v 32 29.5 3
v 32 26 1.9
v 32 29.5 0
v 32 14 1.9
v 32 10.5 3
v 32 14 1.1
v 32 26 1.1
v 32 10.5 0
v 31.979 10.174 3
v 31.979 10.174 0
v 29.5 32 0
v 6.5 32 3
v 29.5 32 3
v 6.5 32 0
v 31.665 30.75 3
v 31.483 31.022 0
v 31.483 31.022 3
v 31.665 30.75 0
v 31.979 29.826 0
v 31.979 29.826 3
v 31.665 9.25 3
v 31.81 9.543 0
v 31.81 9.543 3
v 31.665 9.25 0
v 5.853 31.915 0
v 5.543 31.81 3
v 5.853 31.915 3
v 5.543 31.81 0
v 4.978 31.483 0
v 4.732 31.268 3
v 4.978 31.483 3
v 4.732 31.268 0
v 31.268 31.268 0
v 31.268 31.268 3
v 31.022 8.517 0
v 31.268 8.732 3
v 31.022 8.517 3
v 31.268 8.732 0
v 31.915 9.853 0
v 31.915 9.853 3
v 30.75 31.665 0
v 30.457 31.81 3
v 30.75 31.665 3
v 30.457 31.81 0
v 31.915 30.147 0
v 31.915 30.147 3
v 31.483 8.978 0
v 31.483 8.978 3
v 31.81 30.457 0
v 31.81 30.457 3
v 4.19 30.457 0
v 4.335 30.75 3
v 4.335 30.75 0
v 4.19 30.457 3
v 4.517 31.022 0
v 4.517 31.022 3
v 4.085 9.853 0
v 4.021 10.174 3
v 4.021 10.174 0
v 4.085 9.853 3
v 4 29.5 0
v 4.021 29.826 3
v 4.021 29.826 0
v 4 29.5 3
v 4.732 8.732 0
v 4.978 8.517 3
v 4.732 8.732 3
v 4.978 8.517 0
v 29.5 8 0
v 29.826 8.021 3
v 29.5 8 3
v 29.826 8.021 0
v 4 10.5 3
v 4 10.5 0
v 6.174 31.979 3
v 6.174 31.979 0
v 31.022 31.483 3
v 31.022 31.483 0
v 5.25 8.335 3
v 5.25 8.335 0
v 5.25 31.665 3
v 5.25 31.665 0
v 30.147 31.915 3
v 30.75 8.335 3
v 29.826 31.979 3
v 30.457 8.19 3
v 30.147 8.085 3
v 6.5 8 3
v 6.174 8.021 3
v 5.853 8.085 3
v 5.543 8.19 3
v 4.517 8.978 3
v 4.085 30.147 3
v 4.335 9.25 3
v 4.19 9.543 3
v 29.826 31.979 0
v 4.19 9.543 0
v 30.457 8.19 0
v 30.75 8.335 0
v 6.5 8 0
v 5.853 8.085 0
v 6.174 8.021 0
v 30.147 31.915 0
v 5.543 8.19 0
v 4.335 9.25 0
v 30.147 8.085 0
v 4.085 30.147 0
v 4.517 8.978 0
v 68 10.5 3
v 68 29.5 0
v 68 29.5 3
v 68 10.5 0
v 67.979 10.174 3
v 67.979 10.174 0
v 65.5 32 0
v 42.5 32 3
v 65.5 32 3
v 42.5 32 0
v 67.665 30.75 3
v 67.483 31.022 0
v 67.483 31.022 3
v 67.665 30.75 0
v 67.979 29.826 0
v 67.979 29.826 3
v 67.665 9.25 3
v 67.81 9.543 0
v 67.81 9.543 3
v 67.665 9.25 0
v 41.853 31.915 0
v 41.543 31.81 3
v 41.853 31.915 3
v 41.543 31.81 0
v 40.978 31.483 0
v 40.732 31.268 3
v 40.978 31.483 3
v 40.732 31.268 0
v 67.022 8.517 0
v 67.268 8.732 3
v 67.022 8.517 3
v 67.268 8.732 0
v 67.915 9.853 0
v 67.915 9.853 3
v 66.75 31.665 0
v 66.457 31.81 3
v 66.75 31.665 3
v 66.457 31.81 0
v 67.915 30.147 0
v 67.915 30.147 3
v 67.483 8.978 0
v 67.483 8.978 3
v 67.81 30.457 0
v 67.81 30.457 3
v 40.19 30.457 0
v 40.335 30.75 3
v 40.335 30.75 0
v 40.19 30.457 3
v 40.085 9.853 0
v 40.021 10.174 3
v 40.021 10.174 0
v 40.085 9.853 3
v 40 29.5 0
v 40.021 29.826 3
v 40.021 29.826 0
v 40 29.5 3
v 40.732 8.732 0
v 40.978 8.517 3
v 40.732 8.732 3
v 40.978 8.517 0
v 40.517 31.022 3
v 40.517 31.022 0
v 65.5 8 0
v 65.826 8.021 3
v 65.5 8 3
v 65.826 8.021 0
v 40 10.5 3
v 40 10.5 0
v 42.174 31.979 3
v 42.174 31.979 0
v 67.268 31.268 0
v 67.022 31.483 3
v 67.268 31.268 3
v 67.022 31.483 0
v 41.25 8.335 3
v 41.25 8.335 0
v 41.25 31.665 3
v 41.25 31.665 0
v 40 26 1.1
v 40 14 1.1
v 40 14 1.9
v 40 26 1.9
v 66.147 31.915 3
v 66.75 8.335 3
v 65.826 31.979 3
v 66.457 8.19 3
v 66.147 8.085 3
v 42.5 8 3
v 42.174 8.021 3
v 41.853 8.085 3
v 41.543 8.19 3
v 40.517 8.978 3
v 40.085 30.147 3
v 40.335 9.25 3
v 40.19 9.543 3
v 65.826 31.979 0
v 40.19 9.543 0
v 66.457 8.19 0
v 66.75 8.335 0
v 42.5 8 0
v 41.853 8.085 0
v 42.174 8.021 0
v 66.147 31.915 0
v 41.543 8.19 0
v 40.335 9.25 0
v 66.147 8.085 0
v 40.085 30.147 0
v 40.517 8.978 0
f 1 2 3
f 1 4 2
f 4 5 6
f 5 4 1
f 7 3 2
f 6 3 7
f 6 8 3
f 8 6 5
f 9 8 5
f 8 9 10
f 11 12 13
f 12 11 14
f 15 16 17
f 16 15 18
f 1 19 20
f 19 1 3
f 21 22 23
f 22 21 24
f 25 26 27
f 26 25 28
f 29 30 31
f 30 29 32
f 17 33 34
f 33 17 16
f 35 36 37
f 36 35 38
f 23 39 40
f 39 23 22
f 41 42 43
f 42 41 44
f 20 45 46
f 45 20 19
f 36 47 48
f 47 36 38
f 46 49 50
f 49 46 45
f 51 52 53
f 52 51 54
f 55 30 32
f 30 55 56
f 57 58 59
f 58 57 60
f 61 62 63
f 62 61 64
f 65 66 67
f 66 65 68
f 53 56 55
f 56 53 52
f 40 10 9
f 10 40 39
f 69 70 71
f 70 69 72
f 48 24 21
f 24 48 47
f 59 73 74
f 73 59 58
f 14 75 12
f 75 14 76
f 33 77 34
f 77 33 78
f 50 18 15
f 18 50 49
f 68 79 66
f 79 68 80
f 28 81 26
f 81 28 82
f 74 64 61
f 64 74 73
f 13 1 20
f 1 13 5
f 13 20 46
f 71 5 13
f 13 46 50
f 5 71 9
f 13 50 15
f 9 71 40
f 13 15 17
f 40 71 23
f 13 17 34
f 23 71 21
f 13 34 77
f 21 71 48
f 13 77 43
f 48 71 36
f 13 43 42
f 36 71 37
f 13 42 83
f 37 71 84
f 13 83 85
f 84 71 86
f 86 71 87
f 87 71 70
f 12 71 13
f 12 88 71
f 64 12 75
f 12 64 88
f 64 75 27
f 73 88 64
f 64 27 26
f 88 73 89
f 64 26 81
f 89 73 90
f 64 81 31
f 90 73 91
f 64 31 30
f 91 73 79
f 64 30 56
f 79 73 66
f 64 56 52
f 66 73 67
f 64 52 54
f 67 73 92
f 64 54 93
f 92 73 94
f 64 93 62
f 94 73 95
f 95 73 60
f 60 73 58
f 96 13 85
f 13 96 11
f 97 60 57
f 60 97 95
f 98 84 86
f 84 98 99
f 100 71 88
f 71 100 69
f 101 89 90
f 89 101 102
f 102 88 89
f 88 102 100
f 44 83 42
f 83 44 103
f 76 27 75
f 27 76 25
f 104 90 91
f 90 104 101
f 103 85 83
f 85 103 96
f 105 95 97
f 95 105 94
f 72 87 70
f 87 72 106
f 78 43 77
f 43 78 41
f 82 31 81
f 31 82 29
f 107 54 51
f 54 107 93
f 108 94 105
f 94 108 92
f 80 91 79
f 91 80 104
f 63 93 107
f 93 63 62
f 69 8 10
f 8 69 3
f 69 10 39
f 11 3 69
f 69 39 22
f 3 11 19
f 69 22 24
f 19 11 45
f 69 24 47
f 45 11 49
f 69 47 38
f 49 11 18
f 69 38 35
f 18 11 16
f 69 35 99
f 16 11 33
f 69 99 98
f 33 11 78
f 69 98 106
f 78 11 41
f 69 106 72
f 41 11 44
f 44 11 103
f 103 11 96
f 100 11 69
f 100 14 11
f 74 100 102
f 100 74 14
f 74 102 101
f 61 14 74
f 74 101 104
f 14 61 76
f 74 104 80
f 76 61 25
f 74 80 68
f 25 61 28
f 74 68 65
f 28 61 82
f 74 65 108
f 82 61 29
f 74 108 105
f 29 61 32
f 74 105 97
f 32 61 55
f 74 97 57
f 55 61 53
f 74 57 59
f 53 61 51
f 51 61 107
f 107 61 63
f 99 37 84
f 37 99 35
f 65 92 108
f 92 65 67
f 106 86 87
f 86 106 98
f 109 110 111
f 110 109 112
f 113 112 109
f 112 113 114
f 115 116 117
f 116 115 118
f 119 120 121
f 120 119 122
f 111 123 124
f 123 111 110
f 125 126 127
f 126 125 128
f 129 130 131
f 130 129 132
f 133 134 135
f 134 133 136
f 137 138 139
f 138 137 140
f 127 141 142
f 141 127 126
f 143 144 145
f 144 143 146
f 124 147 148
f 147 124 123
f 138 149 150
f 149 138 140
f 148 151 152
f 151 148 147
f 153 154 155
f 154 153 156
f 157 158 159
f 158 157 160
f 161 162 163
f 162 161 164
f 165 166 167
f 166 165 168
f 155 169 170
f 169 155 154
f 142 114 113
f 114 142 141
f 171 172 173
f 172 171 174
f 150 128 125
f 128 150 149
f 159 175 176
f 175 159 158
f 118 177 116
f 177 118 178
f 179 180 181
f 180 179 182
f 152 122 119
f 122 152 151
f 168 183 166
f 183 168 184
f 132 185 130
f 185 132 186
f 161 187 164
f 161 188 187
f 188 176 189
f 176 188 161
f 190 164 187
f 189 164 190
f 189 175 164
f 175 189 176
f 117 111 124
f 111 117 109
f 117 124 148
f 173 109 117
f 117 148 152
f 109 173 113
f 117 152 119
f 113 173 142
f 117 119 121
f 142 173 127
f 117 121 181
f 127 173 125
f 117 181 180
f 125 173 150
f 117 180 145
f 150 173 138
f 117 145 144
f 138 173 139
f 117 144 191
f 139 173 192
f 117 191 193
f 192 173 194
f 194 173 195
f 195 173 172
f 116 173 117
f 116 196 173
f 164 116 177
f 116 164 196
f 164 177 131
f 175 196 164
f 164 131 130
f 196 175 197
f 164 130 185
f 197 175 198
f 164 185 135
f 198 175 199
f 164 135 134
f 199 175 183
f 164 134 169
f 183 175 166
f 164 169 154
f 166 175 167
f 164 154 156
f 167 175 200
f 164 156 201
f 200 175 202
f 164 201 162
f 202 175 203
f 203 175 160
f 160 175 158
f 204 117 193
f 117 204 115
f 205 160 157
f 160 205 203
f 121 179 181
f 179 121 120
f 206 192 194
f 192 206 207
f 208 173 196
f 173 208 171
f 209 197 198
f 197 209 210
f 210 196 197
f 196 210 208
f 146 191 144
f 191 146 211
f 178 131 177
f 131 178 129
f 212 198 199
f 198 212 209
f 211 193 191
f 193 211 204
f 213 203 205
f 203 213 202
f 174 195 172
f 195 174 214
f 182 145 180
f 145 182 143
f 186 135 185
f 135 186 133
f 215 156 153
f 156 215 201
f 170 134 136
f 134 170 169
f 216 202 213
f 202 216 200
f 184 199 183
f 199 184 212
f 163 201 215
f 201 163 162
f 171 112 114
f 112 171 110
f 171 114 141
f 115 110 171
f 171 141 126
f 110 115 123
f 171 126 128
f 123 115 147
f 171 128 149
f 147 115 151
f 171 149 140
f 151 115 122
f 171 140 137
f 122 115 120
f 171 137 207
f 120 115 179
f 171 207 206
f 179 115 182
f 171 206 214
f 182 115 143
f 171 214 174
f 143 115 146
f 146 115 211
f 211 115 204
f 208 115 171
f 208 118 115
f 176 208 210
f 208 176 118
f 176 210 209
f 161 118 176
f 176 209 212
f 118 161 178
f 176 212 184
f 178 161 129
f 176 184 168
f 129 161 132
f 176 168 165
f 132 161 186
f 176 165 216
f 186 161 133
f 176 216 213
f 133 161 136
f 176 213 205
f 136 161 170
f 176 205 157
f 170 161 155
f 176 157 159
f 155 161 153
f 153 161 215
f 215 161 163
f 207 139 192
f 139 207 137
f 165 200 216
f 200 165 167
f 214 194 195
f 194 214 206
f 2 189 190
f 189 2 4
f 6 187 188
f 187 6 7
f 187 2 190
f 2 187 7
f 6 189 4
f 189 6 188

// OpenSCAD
/*
Sample 010: Dünnsteg-Festkörpergelenk — ausgewogen 0,8 mm
Generated from the FDM Mechanical Sample Library.
Units: millimetres.

Override examples:
  openscad -o custom.stl -D 'view="plate"' -D 'render_fn=64' model.scad
  openscad -o preview.png -D 'view="assembly"' model.scad
*/
use <../../../library/fdm_mechanisms.scad>

render_fn = is_undef(render_fn) ? 48 : render_fn;
view = is_undef(view) ? "plate" : view;
$fn = render_fn;

sample_flexure_hinge(
    view=view,
    beam_t=0.8,
    beam_w=12,
    gap=8
);
